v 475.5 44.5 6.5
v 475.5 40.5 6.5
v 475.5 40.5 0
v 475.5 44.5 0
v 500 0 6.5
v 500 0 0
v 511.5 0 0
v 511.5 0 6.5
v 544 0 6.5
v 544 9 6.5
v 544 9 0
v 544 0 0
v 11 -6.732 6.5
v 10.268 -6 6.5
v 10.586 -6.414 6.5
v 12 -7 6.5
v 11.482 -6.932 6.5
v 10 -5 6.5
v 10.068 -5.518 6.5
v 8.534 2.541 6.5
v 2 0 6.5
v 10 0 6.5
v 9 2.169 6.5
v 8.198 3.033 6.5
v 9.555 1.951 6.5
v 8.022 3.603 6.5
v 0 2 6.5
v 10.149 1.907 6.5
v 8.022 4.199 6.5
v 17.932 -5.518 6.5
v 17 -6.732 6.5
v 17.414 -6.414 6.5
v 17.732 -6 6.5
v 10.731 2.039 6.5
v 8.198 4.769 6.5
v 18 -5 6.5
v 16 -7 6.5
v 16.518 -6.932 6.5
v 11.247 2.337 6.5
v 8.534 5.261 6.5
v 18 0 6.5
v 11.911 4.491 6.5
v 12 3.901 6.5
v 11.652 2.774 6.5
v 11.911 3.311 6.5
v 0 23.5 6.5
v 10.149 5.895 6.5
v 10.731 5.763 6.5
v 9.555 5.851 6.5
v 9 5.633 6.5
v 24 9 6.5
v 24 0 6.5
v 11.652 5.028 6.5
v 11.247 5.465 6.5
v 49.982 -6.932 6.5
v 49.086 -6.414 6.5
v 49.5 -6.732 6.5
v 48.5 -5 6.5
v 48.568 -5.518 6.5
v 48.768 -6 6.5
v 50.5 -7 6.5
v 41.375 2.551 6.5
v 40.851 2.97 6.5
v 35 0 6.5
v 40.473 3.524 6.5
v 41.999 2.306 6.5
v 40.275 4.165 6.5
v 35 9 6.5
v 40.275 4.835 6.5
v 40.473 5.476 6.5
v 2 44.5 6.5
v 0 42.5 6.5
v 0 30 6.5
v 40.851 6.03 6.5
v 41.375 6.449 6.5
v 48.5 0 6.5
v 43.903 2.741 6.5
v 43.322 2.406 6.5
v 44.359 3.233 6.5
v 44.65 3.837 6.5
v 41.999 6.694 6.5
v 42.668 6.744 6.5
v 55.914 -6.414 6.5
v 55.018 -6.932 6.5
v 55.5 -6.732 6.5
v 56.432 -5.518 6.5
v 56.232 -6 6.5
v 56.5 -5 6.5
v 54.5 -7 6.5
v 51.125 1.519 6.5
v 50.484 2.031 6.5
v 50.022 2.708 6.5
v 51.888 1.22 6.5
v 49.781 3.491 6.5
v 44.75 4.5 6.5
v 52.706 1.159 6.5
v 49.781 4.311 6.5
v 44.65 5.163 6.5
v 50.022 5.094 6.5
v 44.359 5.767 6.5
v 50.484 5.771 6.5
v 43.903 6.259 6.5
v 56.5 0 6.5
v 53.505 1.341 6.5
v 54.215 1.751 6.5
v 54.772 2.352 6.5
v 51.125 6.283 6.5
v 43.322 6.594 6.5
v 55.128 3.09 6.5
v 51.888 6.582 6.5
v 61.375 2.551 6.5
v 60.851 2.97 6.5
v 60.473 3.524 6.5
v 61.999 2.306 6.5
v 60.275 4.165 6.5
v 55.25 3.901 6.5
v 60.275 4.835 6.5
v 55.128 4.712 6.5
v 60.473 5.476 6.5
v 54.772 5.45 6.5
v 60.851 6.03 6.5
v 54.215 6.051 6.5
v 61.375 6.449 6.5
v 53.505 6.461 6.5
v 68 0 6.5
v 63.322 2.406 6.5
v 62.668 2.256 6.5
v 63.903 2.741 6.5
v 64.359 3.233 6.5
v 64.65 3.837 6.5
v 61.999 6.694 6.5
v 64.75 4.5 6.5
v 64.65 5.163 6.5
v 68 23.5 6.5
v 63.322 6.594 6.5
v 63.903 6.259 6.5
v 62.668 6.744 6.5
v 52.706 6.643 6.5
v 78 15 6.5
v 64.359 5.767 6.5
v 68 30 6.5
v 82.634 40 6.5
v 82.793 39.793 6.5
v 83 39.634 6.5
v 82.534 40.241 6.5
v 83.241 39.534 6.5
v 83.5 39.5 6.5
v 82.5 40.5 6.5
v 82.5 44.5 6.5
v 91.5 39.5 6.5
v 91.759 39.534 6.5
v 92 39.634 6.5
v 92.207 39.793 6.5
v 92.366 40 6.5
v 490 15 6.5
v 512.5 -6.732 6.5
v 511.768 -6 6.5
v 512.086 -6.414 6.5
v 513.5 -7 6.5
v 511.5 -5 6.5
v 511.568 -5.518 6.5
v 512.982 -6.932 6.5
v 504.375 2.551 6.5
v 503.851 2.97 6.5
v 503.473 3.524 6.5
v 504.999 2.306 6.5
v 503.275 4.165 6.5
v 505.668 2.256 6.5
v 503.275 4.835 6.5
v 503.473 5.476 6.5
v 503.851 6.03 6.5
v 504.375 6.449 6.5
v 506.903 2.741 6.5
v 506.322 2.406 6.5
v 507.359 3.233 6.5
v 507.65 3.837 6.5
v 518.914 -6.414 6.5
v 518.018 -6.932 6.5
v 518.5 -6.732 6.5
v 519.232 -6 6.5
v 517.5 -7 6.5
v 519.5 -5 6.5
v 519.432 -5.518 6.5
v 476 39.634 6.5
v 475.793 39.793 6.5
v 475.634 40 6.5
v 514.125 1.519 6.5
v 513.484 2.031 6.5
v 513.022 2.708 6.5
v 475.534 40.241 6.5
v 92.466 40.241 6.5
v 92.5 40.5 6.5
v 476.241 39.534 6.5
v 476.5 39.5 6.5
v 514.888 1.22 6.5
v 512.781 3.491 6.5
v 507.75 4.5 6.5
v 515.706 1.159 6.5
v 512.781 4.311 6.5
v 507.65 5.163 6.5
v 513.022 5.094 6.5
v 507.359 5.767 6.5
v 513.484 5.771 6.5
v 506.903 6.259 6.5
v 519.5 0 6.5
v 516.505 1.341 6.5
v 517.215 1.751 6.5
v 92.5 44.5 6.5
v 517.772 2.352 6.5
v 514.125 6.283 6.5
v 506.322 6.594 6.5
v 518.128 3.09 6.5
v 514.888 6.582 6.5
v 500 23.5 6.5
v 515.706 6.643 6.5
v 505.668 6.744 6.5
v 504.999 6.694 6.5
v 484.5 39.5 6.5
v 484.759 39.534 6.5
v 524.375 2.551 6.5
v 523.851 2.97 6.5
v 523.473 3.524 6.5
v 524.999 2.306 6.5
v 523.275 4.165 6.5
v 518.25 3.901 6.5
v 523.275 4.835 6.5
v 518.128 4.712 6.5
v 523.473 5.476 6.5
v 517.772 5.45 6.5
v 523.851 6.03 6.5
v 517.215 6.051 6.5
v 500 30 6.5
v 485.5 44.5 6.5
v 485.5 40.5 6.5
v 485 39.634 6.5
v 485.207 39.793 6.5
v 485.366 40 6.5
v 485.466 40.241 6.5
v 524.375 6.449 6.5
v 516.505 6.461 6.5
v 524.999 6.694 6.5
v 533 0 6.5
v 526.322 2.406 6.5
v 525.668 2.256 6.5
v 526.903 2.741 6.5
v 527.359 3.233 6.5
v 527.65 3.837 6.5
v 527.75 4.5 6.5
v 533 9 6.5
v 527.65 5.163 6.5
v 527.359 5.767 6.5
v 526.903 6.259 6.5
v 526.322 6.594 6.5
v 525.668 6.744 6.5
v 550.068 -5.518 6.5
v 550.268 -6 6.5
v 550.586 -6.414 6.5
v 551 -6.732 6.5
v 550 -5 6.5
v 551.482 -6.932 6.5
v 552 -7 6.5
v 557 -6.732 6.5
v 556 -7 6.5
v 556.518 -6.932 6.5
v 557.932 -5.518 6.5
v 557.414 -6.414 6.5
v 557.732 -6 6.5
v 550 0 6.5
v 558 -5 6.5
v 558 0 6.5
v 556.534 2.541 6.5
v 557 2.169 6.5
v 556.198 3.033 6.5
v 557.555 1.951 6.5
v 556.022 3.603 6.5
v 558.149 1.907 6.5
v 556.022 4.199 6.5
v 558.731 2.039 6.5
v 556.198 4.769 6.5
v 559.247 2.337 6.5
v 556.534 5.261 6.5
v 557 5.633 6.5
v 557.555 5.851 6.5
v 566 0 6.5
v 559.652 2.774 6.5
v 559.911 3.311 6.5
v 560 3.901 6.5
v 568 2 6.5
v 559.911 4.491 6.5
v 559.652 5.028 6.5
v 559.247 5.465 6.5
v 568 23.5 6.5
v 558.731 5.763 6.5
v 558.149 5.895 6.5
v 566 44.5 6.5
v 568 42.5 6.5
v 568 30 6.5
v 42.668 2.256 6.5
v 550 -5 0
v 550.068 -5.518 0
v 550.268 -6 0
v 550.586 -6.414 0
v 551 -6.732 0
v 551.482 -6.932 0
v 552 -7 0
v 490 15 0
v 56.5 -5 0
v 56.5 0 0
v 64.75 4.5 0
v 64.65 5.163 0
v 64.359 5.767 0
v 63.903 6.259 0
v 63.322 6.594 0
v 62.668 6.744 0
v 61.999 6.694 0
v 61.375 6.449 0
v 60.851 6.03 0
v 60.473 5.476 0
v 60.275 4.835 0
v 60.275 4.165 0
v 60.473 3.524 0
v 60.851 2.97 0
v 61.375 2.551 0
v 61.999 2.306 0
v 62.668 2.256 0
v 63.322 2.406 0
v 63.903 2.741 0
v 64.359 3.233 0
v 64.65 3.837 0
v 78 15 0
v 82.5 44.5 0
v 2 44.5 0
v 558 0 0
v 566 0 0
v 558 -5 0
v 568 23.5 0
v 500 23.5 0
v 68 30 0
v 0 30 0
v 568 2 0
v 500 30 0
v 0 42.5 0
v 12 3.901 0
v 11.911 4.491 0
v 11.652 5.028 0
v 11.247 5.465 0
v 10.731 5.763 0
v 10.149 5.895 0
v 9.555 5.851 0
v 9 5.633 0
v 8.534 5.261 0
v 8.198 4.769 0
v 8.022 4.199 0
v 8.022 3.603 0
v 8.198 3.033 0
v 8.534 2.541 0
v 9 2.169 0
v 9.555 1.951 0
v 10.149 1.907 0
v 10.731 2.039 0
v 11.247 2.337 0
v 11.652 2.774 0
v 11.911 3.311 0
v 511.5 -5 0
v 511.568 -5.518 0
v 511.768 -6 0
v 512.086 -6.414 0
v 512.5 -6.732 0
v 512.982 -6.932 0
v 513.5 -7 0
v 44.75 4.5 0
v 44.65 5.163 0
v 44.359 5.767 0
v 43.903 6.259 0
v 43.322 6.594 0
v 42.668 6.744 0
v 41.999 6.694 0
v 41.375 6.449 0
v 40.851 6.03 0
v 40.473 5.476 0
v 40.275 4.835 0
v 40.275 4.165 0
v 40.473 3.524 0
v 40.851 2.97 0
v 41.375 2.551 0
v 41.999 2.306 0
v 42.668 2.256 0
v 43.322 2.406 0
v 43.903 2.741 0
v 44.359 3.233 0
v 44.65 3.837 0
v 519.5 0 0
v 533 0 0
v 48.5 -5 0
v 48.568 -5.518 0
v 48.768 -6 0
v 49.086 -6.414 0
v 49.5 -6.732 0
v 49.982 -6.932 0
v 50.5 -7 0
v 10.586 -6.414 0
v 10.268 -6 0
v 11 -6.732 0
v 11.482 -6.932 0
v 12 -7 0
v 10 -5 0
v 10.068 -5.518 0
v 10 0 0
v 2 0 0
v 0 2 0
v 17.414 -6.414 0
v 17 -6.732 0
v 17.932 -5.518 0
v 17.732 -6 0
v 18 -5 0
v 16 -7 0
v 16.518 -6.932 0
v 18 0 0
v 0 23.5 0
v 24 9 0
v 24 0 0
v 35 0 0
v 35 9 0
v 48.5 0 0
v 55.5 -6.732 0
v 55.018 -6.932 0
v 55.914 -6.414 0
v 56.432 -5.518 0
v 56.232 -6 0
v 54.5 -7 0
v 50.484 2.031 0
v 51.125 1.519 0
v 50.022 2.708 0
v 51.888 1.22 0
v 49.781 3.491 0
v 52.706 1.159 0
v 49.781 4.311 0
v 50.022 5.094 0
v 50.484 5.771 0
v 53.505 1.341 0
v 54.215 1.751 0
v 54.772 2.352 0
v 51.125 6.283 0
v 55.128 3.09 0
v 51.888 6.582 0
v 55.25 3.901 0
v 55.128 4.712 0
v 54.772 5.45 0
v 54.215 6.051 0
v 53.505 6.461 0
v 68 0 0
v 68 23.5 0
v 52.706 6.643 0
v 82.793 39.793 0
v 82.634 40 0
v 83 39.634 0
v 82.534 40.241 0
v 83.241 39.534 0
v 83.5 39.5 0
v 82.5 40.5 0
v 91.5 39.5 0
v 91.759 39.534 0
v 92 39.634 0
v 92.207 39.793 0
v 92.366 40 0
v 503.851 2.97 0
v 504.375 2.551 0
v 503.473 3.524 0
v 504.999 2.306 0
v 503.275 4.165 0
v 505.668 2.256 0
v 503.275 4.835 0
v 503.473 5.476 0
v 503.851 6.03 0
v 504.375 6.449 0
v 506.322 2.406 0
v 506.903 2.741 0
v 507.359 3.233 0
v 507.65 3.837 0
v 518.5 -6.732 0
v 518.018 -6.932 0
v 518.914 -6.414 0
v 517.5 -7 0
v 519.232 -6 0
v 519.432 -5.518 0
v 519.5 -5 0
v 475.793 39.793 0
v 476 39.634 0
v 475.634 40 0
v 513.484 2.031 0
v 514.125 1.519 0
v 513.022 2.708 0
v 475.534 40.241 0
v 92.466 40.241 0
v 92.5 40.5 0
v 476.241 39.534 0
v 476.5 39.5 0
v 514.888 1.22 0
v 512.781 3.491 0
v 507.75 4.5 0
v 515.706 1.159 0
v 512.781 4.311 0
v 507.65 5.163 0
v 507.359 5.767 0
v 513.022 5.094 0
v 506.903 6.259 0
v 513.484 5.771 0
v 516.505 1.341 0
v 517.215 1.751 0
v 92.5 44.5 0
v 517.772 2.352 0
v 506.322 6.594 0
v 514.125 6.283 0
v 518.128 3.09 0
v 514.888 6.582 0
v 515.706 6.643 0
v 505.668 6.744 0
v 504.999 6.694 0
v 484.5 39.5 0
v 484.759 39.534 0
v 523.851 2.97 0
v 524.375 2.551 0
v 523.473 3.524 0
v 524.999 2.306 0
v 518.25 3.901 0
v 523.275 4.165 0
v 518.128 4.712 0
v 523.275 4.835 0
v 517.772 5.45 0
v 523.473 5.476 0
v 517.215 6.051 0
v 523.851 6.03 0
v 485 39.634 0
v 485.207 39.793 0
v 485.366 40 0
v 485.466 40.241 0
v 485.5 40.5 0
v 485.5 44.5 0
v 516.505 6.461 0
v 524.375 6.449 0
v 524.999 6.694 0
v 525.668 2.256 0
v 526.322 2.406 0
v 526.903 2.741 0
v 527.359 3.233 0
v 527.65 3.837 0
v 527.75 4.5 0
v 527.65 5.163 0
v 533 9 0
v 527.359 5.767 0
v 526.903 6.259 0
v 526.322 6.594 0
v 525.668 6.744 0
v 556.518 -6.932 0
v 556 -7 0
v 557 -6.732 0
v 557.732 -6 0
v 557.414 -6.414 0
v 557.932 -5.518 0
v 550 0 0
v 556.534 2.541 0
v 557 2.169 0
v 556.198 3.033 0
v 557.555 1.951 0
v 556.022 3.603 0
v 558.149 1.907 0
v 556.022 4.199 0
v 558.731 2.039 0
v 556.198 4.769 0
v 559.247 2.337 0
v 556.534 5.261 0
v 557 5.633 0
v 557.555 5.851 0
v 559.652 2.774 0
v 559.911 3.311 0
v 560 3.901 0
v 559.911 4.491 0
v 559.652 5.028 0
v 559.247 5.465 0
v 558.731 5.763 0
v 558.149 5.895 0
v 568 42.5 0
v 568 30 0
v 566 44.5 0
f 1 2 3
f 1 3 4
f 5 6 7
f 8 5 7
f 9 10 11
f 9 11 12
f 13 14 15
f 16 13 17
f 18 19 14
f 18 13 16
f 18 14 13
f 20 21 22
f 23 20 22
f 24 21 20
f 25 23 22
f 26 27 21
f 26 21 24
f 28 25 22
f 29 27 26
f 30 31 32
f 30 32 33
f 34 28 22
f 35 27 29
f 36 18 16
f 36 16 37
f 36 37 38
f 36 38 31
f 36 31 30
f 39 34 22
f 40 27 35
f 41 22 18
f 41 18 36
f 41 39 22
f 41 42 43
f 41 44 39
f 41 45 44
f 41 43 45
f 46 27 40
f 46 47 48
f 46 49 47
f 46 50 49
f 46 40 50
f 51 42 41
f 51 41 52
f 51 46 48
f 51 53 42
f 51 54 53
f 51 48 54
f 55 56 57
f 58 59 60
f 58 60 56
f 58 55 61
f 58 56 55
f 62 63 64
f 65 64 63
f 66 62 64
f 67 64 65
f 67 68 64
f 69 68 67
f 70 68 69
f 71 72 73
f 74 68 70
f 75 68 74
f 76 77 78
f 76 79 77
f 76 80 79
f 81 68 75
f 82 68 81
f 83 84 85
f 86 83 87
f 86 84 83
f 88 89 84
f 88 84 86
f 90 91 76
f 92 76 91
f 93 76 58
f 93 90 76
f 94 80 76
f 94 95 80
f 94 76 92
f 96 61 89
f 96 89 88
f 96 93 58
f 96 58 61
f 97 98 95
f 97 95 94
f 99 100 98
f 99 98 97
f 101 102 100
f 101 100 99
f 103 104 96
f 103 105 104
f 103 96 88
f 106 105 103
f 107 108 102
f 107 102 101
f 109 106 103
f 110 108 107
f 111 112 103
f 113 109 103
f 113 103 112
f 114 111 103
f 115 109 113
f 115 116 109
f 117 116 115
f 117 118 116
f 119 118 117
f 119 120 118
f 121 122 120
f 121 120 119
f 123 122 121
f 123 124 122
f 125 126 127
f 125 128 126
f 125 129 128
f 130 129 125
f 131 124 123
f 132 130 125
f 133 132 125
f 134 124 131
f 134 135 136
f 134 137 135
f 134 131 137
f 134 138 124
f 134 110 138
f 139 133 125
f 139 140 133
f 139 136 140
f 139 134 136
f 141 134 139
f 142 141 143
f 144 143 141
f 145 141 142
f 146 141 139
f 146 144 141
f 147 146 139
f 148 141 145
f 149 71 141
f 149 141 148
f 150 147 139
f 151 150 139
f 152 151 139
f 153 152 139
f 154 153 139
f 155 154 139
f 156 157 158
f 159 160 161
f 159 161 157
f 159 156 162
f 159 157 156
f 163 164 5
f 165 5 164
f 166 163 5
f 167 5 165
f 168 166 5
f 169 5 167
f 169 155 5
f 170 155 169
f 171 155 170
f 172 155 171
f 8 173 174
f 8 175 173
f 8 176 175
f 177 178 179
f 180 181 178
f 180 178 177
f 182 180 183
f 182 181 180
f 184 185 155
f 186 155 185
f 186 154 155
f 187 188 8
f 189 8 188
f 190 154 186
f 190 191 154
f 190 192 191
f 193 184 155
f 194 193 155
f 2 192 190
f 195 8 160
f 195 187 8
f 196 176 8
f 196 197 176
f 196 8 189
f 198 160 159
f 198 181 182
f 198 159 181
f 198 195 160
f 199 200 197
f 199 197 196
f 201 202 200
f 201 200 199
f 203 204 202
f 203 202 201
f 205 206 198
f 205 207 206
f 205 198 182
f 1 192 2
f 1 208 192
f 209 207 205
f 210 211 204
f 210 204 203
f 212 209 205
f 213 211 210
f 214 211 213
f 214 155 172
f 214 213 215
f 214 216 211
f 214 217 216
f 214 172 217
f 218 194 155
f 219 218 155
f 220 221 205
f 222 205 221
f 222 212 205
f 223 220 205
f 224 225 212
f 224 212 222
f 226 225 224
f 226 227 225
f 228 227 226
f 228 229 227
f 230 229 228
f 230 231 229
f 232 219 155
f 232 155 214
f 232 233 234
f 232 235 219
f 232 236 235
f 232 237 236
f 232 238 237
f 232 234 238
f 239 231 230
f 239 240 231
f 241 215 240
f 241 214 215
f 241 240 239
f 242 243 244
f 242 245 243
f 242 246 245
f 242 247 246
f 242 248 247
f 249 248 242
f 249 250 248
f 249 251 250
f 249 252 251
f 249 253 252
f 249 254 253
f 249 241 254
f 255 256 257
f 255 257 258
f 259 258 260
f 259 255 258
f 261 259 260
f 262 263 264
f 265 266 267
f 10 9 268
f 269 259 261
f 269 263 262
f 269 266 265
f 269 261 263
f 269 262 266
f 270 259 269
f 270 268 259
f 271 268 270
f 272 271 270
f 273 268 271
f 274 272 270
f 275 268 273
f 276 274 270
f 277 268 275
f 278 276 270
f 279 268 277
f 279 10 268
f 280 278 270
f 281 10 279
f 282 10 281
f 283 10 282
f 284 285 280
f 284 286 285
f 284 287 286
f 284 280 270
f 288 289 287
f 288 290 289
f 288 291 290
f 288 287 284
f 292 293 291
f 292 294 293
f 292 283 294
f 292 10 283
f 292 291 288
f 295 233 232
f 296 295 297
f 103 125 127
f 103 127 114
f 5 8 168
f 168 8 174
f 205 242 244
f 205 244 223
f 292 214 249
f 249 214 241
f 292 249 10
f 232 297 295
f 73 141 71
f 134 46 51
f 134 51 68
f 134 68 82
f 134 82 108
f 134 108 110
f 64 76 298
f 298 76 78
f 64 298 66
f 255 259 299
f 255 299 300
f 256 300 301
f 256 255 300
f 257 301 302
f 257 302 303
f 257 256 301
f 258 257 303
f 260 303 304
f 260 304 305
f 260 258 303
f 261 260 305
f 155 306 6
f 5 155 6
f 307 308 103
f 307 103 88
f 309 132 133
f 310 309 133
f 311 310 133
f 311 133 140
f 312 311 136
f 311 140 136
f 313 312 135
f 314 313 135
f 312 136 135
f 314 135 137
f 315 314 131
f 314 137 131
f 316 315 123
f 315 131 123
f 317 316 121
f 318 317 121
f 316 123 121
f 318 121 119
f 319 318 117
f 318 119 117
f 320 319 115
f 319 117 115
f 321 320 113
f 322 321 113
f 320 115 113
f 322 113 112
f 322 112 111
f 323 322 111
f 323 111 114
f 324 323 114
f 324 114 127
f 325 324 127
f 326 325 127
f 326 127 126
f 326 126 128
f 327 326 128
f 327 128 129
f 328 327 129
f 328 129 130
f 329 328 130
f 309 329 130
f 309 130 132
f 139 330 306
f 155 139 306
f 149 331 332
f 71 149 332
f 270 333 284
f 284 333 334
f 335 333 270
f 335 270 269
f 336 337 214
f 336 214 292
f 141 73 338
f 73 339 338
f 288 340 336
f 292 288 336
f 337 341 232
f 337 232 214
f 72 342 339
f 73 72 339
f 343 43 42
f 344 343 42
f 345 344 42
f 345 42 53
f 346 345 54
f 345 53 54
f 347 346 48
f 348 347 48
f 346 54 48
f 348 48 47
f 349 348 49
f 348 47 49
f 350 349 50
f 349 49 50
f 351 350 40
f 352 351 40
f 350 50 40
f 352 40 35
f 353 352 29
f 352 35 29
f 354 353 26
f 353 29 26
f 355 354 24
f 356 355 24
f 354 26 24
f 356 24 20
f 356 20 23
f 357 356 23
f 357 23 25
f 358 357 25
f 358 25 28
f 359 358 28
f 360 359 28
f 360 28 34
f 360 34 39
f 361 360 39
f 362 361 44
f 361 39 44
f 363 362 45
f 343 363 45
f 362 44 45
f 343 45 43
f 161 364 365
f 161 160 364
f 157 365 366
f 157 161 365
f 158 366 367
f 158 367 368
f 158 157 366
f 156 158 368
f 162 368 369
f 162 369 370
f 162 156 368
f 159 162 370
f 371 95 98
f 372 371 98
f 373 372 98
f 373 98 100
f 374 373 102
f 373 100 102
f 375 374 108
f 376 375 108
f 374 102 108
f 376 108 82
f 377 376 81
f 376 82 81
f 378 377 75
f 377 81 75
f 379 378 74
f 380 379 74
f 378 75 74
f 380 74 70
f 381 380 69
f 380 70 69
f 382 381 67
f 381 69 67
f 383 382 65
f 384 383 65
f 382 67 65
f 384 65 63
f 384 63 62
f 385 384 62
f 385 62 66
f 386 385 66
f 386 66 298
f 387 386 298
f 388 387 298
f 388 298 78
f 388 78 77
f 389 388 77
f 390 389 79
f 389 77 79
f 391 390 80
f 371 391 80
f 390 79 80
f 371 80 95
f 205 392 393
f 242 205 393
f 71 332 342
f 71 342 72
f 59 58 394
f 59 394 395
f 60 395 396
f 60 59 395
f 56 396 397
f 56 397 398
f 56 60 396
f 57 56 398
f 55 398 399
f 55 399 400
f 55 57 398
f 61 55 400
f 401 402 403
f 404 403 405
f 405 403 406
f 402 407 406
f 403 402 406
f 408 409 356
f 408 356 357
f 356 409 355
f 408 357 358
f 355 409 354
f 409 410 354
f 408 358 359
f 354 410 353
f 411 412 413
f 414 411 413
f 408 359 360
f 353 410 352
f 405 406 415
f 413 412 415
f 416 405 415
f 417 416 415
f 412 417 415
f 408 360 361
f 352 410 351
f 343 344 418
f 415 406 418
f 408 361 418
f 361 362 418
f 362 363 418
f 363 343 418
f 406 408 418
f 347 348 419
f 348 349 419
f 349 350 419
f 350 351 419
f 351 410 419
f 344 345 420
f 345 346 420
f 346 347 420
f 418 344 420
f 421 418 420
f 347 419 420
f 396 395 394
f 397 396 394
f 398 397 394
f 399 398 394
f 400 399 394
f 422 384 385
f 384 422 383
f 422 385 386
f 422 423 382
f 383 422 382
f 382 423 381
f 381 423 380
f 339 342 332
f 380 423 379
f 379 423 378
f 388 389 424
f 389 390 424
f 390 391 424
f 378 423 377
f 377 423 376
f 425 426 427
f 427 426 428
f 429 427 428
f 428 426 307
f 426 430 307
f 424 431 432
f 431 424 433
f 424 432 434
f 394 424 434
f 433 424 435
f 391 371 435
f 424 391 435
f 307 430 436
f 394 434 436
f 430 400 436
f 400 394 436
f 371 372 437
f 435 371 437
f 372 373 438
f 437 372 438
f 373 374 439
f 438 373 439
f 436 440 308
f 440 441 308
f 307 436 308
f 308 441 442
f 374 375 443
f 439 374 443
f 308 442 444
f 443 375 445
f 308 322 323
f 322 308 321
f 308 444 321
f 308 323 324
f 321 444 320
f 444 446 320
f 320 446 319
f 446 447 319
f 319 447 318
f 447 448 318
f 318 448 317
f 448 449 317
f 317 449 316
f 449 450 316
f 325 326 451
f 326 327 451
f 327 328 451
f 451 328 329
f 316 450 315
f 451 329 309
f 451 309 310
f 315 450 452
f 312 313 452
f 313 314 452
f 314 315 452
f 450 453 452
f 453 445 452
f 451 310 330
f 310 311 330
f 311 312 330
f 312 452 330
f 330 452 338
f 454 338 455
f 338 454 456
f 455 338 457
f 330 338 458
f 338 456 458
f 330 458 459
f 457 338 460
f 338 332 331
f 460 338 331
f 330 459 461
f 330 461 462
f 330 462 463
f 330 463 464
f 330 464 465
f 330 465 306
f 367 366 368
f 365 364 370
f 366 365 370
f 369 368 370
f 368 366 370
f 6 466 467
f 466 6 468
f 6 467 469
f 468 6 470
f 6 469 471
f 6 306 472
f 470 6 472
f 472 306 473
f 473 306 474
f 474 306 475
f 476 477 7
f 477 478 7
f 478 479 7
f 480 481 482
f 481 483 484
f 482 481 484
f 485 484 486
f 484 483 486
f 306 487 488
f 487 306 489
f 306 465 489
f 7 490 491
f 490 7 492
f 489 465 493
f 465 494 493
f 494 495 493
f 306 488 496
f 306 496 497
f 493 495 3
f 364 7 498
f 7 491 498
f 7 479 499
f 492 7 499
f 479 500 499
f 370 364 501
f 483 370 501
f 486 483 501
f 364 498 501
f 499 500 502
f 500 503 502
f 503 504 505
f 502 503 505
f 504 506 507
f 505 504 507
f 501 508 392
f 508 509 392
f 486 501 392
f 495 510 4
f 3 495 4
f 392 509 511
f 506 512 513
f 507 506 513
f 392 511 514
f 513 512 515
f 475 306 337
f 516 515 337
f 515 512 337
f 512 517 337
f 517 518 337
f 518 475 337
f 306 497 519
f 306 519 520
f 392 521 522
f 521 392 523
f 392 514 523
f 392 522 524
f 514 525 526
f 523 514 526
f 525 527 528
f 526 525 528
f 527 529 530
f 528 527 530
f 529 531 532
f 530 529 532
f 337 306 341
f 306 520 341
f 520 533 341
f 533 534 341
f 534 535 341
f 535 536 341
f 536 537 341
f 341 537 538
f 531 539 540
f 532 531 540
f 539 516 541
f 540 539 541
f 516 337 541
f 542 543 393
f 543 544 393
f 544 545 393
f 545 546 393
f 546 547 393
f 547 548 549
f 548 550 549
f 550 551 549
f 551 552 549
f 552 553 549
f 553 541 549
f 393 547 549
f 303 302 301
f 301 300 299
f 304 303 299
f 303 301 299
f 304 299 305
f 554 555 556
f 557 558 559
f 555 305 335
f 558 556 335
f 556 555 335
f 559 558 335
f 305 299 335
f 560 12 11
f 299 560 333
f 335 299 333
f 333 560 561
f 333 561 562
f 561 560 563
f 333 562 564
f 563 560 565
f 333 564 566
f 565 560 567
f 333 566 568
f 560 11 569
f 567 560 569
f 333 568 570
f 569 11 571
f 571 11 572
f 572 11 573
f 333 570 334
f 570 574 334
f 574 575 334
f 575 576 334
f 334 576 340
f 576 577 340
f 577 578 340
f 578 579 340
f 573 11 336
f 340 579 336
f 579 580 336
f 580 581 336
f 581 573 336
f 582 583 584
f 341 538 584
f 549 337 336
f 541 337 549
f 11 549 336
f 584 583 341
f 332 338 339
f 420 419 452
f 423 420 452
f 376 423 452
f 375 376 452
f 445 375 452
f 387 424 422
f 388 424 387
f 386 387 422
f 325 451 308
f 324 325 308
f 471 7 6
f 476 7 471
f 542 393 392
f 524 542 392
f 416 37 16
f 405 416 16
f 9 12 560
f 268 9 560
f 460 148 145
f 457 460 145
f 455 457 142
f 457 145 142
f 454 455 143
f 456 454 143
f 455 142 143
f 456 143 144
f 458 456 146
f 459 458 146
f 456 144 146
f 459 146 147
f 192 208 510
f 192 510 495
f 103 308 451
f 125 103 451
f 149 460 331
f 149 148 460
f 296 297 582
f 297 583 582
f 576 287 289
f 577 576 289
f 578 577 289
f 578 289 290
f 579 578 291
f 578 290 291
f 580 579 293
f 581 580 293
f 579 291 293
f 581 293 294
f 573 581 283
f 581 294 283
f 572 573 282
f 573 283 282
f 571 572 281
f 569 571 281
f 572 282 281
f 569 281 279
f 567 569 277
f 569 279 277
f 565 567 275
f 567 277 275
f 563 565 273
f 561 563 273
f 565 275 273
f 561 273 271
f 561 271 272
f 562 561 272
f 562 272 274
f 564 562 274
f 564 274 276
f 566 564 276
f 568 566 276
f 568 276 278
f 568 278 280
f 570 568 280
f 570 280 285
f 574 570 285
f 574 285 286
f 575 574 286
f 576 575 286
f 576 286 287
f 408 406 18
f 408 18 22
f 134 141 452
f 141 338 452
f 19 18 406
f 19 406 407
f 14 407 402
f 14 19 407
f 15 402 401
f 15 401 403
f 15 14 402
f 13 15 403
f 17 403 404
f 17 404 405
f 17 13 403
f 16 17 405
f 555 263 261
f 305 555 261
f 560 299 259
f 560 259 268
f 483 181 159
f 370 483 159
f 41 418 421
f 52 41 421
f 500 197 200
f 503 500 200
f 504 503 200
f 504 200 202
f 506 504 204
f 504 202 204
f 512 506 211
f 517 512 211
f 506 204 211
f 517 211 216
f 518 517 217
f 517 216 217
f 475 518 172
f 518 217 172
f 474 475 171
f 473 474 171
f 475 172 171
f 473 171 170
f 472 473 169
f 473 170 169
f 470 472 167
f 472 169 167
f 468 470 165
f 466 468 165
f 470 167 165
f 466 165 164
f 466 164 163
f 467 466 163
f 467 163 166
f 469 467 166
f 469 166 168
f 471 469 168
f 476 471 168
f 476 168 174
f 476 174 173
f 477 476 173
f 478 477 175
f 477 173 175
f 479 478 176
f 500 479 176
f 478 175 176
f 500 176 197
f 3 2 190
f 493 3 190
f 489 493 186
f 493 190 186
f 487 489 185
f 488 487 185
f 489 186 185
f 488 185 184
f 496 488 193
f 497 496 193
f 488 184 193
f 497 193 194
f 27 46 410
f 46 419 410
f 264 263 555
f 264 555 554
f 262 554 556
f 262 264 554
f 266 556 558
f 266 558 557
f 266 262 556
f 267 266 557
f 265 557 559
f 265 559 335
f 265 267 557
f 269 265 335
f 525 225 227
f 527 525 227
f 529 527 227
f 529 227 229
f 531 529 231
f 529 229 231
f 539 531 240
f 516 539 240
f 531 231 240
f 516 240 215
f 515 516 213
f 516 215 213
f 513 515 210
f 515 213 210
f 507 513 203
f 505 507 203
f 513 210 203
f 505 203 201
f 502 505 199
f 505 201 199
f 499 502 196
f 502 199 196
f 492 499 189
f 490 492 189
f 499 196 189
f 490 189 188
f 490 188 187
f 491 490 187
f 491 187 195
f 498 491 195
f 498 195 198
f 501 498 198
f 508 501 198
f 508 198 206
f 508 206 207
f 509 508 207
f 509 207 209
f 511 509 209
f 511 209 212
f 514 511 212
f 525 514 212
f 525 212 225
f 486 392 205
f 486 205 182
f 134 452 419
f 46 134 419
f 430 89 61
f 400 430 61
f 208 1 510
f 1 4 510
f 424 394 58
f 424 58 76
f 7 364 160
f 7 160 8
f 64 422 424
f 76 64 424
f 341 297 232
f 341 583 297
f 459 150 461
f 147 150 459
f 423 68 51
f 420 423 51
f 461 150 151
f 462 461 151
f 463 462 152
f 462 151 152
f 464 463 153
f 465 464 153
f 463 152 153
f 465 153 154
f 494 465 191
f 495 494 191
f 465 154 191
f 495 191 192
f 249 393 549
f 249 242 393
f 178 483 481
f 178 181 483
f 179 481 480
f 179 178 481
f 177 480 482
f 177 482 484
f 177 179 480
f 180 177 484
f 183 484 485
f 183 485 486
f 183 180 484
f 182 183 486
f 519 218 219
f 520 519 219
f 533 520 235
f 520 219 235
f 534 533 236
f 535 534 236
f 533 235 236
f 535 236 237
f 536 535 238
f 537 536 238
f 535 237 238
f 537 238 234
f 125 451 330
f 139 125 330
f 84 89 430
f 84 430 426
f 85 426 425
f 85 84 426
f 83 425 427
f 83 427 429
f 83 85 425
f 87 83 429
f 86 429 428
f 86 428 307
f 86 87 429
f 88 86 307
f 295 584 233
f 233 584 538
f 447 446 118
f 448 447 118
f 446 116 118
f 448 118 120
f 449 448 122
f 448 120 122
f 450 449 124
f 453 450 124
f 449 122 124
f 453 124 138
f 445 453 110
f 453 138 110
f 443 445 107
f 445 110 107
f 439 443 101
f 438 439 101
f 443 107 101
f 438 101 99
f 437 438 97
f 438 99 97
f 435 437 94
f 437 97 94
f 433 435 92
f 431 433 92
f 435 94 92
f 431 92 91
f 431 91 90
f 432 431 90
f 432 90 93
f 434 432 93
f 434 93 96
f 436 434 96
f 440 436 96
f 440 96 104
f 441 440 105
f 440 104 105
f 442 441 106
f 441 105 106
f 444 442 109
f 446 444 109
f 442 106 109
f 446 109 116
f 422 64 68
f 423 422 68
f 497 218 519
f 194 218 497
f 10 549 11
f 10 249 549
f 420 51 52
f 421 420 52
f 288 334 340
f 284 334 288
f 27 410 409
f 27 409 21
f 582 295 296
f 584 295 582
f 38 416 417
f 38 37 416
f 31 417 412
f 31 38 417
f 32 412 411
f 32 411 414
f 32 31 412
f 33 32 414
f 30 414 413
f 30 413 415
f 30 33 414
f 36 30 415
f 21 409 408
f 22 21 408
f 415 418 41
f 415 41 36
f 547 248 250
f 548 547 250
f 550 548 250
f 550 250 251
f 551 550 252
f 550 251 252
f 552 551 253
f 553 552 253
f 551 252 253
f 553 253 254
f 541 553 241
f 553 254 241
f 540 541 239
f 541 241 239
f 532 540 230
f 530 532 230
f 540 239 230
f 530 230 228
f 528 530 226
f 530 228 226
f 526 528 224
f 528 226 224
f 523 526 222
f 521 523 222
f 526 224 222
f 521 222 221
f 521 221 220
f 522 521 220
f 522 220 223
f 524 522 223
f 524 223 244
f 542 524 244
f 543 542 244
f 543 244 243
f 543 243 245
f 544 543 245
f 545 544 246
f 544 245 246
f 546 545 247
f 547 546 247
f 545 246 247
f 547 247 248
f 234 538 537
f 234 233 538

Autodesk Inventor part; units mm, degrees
ref_plane "YZ Plane" through (0, 0, 0) normal (1, 0, 0) x (0, 1, 0)
ref_plane "XZ Plane" through (0, 0, 0) normal (0, 1, 0) x (-1, 0, 0)
ref_plane "XY Plane" through (0, 0, 0) normal (0, 0, 1) x (1, 0, 0)
sketch "Sketch1" plane through (0, 0, 0) normal (0, 0, 1) x (1, 0, 0)
  line L0 (568, 44.5) -> (0, 44.5)
  line L1 (68, 0) -> (78, 15)
  line L2 (78, 15) -> (490, 15)
  line L3 (490, 15) -> (500, 0)
  line L4 (0, 0) -> (68, 0)
  line L5 (500, 0) -> (568, 0)
  line L6 (0, 30) -> (68, 30)
  line L7 (68, 30) -> (68, 23.5)
  line L8 (68, 23.5) -> (0, 23.5)
  line L9 (0, 44.5) -> (0, 30)
  line L10 (0, 23.5) -> (0, 0)
  line L11 (568, 30) -> (500, 30)
  line L12 (500, 30) -> (500, 23.5)
  line L13 (500, 23.5) -> (568, 23.5)
  line L14 (568, 0) -> (568, 23.5)
  line L15 (568, 30) -> (568, 44.5)
  dimension "d3" = 6.5
  dimension "d4" = 68
  dimension "d5" = 68
  dimension "d6" = 568
  dimension "d7" = 15
  dimension "d8" = 23.5
  dimension "d9" = 14.5
  dimension "d12" = 10
  dimension "d13" = 10
  dimension "d14" = 10
  dimension "d15" = 10
extrude "Extrusion1" add sketch "Sketch1" along normal blind 6.5
sketch "Sketch2" plane through (0, 0, 6.5) normal (0, 0, 1) x (1, 0, 0)
  line L0 (0, 0) -> (68, 0) projected
  line L1 (500, 0) -> (568, 0) projected
  line L2 (568, 0) -> (568, 23.5) projected
  line L3 (568, 30) -> (568, 44.5) projected
  line L4 (568, 44.5) -> (0, 44.5) projected
  line L5 (0, 44.5) -> (0, 30) projected
  line L6 (0, 23.5) -> (0, 0) projected
  line L7 (24, 0) -> (35, 0)
  line L8 (35, 0) -> (35, 9)
  line L9 (35, 9) -> (24, 9)
  line L10 (24, 9) -> (24, 0)
  circle A0 centre (42.5, 4.5) radius 2.25
  circle A1 centre (52.5, 3.901) radius 2.75
  circle A2 centre (62.5, 4.5) radius 2.25
  line L11 (544, 0) -> (533, 0)
  line L12 (533, 0) -> (533, 9)
  line L13 (533, 9) -> (544, 9)
  line L14 (544, 9) -> (544, 0)
  circle A3 centre (505.5, 4.5) radius 2.25
  circle A4 centre (515.5, 3.901) radius 2.75
  circle A5 centre (525.5, 4.5) radius 2.25
  line L15 (82.5, 44.5) -> (92.5, 44.5)
  line L16 (92.5, 44.5) -> (92.5, 40.5)
  line L17 (91.5, 39.5) -> (83.5, 39.5)
  line L18 (82.5, 40.5) -> (82.5, 44.5)
  line L19 (475.5, 44.5) -> (485.5, 44.5)
  line L20 (485.5, 44.5) -> (485.5, 40.5)
  line L21 (484.5, 39.5) -> (476.5, 39.5)
  line L22 (475.5, 40.5) -> (475.5, 44.5)
  arc A6 (82.5, 40.5) -> (83.5, 39.5) centre (83.5, 40.5) ccw
  arc A7 (91.5, 39.5) -> (92.5, 40.5) centre (91.5, 40.5) ccw
  arc A8 (475.5, 40.5) -> (476.5, 39.5) centre (476.5, 40.5) ccw
  arc A9 (484.5, 39.5) -> (485.5, 40.5) centre (484.5, 40.5) ccw
  circle A10 centre (29.5, 3.901) radius 7.5 construction
  point P0 (538.5, 9)
  point P1 (35, 4.5)
  point P2 (87.5, 39.5)
  point P3 (480.5, 39.5)
  dimension "d16" = 11
  dimension "d18" = 4.5
  dimension "d19" = 5.5
  dimension "d20" = 11
  dimension "d21" = 1
  dimension "d22" = 10
  dimension "d23" = 10
  dimension "d27" = 24
  dimension "d29" = 23
  dimension "d30" = 24
  dimension "d31" = 10
  dimension "d32" = 10
  dimension "d33" = 10
  dimension "d34" = 10
  dimension "d35" = 9
  dimension "d38" = 15
  dimension "d39" = 23
  dimension "d49" = 87.5
  dimension "d50" = 87.5
  dimension "d63" = 5
extrude "Extrusion2" cut sketch "Sketch2" against normal through all
chamfer "Chamfer1" distance 2 angle 45 4 edges at (0, 44.5, 3.25) (0, 0, 3.25) (568, 44.5, 3.25) (568, 0, 3.25)
sketch "Sketch3" plane through (0, 0, 6.5) normal (0, 0, 1) x (1, 0, 0)
  line L0 (568, 2) -> (568, 23.5) projected
  line L1 (0, 23.5) -> (0, 2) projected
  circle A0 centre (52.5, 3.901) radius 2.75 projected
  circle A1 centre (10, 3.901) radius 2
  circle A2 centre (558, 3.901) radius 2
  point P0 (0, 0)
  dimension "d43" = 4
  dimension "d44" = 10
  dimension "d45" = 4
  dimension "d46" = 10
extrude "Extrusion3" cut sketch "Sketch3" against normal through all contours A1 | A2
sketch "Sketch4" plane through (0, 0, 6.5) normal (0, 0, 1) x (1, 0, 0)
  line L0 (568, 2) -> (568, 23.5) projected
  line L1 (0, 23.5) -> (0, 2) projected
  line L2 (2, 0) -> (24, 0) projected
  line L3 (35, 0) -> (68, 0) projected
  line L4 (500, 0) -> (533, 0) projected
  line L5 (544, 0) -> (566, 0) projected
  line L6 (10, 0) -> (18, 0)
  line L7 (18, 0) -> (18, -5)
  line L8 (16, -7) -> (12, -7)
  line L9 (10, -5) -> (10, 0)
  line L10 (48.5, 0) -> (56.5, 0)
  line L11 (56.5, 0) -> (56.5, -5)
  line L12 (54.5, -7) -> (50.5, -7)
  line L13 (48.5, -5) -> (48.5, 0)
  line L14 (511.5, 0) -> (519.5, 0)
  line L15 (519.5, 0) -> (519.5, -5)
  line L16 (517.5, -7) -> (513.5, -7)
  line L17 (511.5, -5) -> (511.5, 0)
  line L18 (550, 0) -> (558, 0)
  line L19 (558, 0) -> (558, -5)
  line L20 (556, -7) -> (552, -7)
  line L21 (550, -5) -> (550, 0)
  arc A0 (10, -5) -> (12, -7) centre (12, -5) ccw
  arc A1 (16, -7) -> (18, -5) centre (16, -5) ccw
  arc A2 (48.5, -5) -> (50.5, -7) centre (50.5, -5) ccw
  arc A3 (54.5, -7) -> (56.5, -5) centre (54.5, -5) ccw
  arc A4 (511.5, -5) -> (513.5, -7) centre (513.5, -5) ccw
  arc A5 (517.5, -7) -> (519.5, -5) centre (517.5, -5) ccw
  arc A6 (550, -5) -> (552, -7) centre (552, -5) ccw
  arc A7 (556, -7) -> (558, -5) centre (556, -5) ccw
  point P0 (0, 0)
  dimension "d51" = 2
  dimension "d52" = 8
  dimension "d53" = 8
  dimension "d54" = 8
  dimension "d55" = 8
  dimension "d56" = 7
  dimension "d57" = 10
  dimension "d58" = 30.5
  dimension "d59" = 10
  dimension "d60" = 30.5
extrude "Extrusion4" add sketch "Sketch4" against normal blind 6.5
equation "\"d5\" = d4"
equation "\"d20\" = d16"
equation "\"d23\" = d22"
equation "\"d30\" = d27"
equation "\"d50\" = d49"
equation "\"d45\" = d43"
equation "\"d46\" = d44"
equation "\"d59\" = d57"
equation "\"d60\" = d58"
properties part number "x_axis_chain_holder"
